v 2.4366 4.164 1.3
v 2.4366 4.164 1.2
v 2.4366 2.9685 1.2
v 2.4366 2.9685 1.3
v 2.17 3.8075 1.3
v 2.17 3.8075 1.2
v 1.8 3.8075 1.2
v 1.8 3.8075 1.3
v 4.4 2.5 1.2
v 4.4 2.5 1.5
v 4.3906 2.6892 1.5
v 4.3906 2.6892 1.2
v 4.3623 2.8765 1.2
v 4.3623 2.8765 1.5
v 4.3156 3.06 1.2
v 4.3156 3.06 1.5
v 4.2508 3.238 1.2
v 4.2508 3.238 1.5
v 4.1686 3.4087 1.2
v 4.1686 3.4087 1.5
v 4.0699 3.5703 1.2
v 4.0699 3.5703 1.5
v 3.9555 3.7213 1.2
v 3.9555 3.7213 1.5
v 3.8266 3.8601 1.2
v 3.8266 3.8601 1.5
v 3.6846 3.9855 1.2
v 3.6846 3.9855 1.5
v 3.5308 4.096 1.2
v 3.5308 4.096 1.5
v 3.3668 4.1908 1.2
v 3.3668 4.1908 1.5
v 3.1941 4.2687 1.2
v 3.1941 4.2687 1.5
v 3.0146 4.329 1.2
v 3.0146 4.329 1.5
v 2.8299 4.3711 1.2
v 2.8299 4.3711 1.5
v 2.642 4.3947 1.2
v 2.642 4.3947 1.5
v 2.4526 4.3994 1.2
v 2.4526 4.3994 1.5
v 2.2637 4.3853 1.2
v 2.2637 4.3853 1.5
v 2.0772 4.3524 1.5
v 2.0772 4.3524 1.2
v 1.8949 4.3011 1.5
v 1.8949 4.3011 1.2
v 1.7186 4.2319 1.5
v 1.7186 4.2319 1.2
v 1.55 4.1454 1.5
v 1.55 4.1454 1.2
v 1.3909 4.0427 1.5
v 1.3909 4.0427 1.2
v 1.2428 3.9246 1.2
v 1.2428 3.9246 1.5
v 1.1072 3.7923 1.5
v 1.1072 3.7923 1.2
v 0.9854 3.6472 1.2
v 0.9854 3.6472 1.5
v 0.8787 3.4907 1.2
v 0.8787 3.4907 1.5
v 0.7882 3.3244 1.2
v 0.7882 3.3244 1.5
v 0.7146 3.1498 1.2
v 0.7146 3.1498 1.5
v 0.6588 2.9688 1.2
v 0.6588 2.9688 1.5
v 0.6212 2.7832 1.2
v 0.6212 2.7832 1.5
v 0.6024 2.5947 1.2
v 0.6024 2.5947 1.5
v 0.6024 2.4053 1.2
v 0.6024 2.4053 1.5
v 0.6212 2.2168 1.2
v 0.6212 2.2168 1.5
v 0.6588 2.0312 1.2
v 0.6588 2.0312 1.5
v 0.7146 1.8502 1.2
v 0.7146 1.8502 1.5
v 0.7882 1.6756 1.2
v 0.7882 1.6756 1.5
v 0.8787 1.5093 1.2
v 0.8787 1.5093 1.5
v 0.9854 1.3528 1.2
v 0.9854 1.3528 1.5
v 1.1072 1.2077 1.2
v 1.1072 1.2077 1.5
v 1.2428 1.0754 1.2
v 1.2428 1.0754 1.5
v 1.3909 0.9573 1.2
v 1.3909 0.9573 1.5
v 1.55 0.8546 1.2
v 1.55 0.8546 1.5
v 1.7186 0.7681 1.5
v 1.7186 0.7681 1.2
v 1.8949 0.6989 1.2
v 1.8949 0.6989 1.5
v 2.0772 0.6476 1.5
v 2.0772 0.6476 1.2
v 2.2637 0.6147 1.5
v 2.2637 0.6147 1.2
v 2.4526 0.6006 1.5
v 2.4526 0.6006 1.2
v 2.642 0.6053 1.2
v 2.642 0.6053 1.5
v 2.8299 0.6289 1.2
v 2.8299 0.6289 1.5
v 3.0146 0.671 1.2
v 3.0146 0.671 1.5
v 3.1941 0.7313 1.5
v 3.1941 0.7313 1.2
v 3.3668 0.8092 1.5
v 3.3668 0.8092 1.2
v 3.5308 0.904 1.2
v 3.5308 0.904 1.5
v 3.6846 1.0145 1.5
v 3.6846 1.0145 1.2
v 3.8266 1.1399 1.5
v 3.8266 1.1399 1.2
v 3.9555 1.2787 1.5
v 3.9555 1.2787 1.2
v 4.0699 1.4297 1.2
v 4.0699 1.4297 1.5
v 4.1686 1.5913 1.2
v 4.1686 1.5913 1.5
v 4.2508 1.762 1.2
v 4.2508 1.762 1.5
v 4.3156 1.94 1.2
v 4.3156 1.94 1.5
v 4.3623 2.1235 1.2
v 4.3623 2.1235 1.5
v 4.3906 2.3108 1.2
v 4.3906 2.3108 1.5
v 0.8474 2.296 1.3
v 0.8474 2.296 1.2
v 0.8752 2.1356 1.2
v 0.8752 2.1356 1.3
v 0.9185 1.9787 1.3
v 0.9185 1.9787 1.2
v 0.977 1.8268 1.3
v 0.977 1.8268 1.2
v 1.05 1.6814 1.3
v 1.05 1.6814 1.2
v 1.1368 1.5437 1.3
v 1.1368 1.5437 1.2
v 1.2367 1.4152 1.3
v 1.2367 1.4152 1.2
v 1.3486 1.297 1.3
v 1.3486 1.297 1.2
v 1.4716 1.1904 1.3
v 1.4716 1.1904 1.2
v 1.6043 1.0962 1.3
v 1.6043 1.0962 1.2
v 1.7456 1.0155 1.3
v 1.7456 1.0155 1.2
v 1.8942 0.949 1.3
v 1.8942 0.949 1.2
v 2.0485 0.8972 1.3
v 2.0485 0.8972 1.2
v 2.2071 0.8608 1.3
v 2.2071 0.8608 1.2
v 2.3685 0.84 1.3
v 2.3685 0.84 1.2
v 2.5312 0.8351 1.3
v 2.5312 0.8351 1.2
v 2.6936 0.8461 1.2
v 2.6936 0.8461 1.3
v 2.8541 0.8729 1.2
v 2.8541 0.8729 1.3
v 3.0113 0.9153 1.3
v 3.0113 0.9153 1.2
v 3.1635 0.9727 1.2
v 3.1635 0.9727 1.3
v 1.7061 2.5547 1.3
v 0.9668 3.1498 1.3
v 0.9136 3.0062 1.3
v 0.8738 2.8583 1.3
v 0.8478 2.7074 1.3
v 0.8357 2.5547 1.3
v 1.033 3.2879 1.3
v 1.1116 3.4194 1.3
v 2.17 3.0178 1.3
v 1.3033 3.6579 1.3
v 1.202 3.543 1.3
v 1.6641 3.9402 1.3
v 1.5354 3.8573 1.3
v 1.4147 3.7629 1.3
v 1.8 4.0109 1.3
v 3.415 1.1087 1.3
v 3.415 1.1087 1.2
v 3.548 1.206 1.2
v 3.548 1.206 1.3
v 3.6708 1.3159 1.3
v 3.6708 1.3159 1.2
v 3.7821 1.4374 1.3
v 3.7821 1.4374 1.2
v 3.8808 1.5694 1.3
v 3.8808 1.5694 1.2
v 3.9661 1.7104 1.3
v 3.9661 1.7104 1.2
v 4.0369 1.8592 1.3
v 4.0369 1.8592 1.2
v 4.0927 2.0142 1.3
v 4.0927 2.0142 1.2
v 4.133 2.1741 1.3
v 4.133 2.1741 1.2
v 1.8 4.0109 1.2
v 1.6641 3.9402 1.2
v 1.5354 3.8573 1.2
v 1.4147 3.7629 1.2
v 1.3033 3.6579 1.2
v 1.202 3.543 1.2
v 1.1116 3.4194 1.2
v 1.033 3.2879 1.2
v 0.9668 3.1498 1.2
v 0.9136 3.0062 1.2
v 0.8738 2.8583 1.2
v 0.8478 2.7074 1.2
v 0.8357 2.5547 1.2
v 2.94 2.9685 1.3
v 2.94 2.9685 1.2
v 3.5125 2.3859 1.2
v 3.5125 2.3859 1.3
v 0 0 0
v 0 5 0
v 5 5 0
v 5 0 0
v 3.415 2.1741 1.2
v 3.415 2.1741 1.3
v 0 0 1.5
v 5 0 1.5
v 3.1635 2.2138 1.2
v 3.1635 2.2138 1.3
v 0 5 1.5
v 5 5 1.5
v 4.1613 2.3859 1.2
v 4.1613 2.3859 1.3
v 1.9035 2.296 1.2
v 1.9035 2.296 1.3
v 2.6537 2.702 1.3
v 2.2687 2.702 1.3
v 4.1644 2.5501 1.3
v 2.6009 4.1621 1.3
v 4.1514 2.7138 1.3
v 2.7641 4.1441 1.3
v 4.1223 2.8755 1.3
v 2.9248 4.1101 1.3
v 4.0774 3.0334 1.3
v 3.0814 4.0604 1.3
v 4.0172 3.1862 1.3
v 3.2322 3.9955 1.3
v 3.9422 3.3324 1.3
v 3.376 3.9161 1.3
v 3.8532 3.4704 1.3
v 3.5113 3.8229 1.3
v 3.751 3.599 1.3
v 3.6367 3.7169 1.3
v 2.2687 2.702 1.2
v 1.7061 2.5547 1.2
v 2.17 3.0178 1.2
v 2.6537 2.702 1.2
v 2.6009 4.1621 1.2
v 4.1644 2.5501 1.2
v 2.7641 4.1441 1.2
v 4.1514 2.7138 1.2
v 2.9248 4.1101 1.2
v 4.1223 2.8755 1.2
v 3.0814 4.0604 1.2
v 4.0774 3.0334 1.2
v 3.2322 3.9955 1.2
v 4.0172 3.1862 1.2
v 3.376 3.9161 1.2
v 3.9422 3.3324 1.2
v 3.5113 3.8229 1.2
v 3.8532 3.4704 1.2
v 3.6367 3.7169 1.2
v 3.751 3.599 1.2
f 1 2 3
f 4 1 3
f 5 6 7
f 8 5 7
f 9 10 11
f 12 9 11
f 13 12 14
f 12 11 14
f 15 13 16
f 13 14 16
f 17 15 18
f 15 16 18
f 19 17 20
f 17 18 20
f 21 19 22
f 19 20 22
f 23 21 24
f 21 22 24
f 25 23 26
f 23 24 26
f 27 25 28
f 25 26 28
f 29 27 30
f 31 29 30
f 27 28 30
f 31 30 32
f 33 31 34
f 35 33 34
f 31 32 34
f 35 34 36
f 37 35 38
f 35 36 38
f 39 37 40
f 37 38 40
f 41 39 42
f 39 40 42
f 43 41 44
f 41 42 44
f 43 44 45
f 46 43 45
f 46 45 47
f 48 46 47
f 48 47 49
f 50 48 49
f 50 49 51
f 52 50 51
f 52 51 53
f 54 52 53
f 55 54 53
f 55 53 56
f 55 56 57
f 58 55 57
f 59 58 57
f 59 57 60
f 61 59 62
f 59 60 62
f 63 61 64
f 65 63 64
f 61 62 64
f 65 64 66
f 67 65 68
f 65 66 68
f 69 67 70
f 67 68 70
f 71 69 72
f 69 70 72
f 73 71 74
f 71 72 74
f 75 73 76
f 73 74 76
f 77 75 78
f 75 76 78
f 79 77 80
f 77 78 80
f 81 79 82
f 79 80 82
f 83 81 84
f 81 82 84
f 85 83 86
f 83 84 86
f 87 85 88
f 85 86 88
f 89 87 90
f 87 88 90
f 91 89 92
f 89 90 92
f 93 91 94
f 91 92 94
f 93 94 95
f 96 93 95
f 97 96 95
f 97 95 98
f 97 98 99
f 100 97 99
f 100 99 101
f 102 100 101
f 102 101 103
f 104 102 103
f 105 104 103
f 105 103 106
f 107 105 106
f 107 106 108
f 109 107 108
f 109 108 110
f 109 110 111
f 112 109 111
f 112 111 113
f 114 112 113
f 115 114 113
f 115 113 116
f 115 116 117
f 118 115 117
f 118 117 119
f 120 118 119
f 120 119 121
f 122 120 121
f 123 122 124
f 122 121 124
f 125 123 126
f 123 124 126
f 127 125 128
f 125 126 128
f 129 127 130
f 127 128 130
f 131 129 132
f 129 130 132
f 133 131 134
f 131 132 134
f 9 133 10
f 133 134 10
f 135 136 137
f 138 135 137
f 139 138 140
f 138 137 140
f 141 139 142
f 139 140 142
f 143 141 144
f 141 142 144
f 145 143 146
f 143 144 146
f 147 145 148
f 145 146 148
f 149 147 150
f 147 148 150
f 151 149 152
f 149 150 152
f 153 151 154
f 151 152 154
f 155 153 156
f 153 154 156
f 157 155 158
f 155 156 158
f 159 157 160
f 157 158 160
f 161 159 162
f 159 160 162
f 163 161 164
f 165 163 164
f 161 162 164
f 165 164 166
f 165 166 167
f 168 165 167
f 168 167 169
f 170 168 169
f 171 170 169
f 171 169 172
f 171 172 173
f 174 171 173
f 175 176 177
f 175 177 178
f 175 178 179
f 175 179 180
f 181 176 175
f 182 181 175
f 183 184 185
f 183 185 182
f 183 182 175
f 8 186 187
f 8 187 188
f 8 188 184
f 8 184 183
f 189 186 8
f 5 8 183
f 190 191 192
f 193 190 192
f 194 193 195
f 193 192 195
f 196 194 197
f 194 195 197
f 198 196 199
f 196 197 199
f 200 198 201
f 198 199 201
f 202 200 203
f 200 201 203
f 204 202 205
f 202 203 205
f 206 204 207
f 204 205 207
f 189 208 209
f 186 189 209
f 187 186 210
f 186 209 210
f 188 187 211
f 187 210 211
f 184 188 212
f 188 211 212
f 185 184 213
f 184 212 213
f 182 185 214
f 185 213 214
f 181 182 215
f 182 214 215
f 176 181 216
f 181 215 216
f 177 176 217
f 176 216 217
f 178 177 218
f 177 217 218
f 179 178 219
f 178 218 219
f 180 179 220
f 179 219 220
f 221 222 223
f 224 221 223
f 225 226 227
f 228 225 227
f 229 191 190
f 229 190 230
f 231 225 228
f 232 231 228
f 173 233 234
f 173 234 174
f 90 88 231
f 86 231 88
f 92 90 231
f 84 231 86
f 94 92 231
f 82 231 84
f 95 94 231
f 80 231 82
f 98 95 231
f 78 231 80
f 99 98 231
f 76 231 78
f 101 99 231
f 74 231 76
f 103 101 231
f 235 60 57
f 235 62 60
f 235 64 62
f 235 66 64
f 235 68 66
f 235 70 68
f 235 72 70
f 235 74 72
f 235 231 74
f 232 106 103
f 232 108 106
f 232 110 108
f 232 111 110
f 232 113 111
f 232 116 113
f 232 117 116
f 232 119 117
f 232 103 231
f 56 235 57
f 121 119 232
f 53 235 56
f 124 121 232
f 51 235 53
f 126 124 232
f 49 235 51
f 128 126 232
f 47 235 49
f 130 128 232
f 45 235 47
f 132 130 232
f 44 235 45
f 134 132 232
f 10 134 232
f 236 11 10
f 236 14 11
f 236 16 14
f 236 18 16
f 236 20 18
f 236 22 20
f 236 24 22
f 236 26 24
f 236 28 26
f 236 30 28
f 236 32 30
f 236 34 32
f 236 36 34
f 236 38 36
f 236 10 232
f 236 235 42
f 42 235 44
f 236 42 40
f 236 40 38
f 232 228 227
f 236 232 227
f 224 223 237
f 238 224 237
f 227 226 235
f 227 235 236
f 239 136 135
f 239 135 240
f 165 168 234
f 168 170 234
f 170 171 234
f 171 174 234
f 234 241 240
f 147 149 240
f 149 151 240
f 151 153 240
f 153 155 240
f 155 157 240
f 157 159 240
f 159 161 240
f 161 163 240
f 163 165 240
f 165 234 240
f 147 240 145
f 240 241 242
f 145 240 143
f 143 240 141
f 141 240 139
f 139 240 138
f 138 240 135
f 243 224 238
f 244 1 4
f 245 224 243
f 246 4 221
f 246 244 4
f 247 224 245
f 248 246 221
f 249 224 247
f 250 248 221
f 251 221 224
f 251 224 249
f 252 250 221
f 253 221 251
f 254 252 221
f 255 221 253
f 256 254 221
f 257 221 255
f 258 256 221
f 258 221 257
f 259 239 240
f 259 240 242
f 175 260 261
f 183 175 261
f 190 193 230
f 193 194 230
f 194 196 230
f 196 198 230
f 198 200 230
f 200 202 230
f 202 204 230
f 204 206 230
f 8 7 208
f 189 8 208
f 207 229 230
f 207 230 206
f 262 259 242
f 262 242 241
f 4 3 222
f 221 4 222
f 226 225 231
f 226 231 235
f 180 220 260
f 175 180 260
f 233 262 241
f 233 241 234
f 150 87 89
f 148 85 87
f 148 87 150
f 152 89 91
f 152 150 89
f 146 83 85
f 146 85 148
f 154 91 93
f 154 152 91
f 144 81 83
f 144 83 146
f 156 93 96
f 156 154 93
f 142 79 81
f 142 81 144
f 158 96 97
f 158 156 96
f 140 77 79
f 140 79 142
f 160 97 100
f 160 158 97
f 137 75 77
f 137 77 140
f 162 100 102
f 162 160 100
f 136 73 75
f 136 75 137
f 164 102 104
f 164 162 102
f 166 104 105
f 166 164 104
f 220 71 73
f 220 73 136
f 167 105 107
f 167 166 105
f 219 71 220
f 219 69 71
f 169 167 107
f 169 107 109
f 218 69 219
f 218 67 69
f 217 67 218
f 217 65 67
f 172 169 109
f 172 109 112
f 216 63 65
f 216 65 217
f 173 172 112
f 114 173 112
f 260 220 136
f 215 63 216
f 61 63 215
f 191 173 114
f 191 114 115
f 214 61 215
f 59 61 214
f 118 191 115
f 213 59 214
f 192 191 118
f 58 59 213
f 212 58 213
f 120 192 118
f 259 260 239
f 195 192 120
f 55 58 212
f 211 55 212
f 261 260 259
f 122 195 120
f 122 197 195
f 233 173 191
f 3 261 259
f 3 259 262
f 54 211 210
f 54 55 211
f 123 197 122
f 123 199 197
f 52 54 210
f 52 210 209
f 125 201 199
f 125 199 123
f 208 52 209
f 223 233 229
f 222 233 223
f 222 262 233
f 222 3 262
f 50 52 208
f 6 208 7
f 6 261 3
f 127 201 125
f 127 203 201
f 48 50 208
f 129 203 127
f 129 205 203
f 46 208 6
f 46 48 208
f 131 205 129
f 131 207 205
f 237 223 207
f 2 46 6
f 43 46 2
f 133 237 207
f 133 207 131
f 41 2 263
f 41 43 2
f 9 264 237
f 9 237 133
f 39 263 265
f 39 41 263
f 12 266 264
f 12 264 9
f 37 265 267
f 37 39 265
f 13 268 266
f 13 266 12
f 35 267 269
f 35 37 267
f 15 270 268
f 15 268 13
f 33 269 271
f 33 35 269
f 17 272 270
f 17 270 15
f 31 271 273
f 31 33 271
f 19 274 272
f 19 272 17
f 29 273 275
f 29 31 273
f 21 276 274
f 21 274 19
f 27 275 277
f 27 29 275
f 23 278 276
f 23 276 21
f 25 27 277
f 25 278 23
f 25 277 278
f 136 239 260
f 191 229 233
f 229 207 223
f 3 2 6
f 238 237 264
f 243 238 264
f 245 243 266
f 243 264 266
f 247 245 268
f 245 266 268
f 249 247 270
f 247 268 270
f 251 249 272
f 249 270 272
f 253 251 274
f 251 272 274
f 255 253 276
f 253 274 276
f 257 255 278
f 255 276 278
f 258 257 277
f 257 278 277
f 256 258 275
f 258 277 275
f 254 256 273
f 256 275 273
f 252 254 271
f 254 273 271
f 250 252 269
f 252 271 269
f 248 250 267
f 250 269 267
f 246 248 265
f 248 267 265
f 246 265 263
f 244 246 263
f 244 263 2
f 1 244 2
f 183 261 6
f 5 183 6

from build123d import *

# Parameters (mm, degrees)
SKETCH_W     = 5
SKETCH_H     = 5
PAD_DEPTH    = 1.5
SKETCH001_R  = 1.9
POCKET_DEPTH = 0.3
PAD001_DEPTH = 0.1


with BuildPart() as part:
    # Sketch → Pad (new body)
    with BuildSketch(Plane.XY):
        with Locations((2.5, 2.5)):
            Rectangle(SKETCH_W, SKETCH_H)
    extrude(amount=PAD_DEPTH)

    # Sketch001 → Pocket (cut)
    with BuildSketch(Plane.XY.offset(1.5)):
        with Locations((2.5, 2.5)):
            Circle(SKETCH001_R)
    extrude(amount=-POCKET_DEPTH, mode=Mode.SUBTRACT)

    # Sketch002 → Pad001 (new body)
    with BuildSketch(Plane.XY.offset(1.2)):
        with BuildLine():
            Line((0.835727, 2.554672), (1.706074, 2.554672))
            Line((1.706074, 2.554672), (2.170018, 3.017841))
            Line((2.170018, 3.017841), (2.170018, 3.807533))
            Line((2.170018, 3.807533), (1.800006, 3.807533))
            Line((1.800006, 3.807533), (1.800006, 4.010895))
            ThreePointArc((1.800006, 4.010895), (1.111625, 3.419352), (0.835727, 2.554672))
        make_face()
        with BuildLine():
            Line((2.436646, 4.163965), (2.436646, 2.968485))
            Line((2.436646, 2.968485), (2.939967, 2.968485))
            Line((2.939967, 2.968485), (3.512495, 2.385876))
            Line((3.512495, 2.385876), (4.161255, 2.385876))
            ThreePointArc((4.161255, 2.385876), (3.695292, 3.659341), (2.436646, 4.163965))
        make_face()
        with BuildLine():
            Line((0.847377, 2.295966), (1.903497, 2.295966))
            Line((1.903497, 2.295966), (2.268729, 2.701964))
            Line((2.268729, 2.701964), (2.653704, 2.701964))
            Line((2.653704, 2.701964), (3.163541, 2.213752))
            Line((3.163541, 2.213752), (3.163541, 0.972745))
            ThreePointArc((0.847377, 2.295966), (1.673986, 1.054146), (3.163541, 0.972745))
        make_face()
        with BuildLine():
            Line((3.414982, 1.108741), (3.414982, 2.174051))
            Line((3.414982, 2.174051), (4.132958, 2.174051))
            ThreePointArc((3.414982, 1.108741), (3.880841, 1.56937), (4.132958, 2.174051))
        make_face()
    extrude(amount=PAD001_DEPTH)


solid = part.part
